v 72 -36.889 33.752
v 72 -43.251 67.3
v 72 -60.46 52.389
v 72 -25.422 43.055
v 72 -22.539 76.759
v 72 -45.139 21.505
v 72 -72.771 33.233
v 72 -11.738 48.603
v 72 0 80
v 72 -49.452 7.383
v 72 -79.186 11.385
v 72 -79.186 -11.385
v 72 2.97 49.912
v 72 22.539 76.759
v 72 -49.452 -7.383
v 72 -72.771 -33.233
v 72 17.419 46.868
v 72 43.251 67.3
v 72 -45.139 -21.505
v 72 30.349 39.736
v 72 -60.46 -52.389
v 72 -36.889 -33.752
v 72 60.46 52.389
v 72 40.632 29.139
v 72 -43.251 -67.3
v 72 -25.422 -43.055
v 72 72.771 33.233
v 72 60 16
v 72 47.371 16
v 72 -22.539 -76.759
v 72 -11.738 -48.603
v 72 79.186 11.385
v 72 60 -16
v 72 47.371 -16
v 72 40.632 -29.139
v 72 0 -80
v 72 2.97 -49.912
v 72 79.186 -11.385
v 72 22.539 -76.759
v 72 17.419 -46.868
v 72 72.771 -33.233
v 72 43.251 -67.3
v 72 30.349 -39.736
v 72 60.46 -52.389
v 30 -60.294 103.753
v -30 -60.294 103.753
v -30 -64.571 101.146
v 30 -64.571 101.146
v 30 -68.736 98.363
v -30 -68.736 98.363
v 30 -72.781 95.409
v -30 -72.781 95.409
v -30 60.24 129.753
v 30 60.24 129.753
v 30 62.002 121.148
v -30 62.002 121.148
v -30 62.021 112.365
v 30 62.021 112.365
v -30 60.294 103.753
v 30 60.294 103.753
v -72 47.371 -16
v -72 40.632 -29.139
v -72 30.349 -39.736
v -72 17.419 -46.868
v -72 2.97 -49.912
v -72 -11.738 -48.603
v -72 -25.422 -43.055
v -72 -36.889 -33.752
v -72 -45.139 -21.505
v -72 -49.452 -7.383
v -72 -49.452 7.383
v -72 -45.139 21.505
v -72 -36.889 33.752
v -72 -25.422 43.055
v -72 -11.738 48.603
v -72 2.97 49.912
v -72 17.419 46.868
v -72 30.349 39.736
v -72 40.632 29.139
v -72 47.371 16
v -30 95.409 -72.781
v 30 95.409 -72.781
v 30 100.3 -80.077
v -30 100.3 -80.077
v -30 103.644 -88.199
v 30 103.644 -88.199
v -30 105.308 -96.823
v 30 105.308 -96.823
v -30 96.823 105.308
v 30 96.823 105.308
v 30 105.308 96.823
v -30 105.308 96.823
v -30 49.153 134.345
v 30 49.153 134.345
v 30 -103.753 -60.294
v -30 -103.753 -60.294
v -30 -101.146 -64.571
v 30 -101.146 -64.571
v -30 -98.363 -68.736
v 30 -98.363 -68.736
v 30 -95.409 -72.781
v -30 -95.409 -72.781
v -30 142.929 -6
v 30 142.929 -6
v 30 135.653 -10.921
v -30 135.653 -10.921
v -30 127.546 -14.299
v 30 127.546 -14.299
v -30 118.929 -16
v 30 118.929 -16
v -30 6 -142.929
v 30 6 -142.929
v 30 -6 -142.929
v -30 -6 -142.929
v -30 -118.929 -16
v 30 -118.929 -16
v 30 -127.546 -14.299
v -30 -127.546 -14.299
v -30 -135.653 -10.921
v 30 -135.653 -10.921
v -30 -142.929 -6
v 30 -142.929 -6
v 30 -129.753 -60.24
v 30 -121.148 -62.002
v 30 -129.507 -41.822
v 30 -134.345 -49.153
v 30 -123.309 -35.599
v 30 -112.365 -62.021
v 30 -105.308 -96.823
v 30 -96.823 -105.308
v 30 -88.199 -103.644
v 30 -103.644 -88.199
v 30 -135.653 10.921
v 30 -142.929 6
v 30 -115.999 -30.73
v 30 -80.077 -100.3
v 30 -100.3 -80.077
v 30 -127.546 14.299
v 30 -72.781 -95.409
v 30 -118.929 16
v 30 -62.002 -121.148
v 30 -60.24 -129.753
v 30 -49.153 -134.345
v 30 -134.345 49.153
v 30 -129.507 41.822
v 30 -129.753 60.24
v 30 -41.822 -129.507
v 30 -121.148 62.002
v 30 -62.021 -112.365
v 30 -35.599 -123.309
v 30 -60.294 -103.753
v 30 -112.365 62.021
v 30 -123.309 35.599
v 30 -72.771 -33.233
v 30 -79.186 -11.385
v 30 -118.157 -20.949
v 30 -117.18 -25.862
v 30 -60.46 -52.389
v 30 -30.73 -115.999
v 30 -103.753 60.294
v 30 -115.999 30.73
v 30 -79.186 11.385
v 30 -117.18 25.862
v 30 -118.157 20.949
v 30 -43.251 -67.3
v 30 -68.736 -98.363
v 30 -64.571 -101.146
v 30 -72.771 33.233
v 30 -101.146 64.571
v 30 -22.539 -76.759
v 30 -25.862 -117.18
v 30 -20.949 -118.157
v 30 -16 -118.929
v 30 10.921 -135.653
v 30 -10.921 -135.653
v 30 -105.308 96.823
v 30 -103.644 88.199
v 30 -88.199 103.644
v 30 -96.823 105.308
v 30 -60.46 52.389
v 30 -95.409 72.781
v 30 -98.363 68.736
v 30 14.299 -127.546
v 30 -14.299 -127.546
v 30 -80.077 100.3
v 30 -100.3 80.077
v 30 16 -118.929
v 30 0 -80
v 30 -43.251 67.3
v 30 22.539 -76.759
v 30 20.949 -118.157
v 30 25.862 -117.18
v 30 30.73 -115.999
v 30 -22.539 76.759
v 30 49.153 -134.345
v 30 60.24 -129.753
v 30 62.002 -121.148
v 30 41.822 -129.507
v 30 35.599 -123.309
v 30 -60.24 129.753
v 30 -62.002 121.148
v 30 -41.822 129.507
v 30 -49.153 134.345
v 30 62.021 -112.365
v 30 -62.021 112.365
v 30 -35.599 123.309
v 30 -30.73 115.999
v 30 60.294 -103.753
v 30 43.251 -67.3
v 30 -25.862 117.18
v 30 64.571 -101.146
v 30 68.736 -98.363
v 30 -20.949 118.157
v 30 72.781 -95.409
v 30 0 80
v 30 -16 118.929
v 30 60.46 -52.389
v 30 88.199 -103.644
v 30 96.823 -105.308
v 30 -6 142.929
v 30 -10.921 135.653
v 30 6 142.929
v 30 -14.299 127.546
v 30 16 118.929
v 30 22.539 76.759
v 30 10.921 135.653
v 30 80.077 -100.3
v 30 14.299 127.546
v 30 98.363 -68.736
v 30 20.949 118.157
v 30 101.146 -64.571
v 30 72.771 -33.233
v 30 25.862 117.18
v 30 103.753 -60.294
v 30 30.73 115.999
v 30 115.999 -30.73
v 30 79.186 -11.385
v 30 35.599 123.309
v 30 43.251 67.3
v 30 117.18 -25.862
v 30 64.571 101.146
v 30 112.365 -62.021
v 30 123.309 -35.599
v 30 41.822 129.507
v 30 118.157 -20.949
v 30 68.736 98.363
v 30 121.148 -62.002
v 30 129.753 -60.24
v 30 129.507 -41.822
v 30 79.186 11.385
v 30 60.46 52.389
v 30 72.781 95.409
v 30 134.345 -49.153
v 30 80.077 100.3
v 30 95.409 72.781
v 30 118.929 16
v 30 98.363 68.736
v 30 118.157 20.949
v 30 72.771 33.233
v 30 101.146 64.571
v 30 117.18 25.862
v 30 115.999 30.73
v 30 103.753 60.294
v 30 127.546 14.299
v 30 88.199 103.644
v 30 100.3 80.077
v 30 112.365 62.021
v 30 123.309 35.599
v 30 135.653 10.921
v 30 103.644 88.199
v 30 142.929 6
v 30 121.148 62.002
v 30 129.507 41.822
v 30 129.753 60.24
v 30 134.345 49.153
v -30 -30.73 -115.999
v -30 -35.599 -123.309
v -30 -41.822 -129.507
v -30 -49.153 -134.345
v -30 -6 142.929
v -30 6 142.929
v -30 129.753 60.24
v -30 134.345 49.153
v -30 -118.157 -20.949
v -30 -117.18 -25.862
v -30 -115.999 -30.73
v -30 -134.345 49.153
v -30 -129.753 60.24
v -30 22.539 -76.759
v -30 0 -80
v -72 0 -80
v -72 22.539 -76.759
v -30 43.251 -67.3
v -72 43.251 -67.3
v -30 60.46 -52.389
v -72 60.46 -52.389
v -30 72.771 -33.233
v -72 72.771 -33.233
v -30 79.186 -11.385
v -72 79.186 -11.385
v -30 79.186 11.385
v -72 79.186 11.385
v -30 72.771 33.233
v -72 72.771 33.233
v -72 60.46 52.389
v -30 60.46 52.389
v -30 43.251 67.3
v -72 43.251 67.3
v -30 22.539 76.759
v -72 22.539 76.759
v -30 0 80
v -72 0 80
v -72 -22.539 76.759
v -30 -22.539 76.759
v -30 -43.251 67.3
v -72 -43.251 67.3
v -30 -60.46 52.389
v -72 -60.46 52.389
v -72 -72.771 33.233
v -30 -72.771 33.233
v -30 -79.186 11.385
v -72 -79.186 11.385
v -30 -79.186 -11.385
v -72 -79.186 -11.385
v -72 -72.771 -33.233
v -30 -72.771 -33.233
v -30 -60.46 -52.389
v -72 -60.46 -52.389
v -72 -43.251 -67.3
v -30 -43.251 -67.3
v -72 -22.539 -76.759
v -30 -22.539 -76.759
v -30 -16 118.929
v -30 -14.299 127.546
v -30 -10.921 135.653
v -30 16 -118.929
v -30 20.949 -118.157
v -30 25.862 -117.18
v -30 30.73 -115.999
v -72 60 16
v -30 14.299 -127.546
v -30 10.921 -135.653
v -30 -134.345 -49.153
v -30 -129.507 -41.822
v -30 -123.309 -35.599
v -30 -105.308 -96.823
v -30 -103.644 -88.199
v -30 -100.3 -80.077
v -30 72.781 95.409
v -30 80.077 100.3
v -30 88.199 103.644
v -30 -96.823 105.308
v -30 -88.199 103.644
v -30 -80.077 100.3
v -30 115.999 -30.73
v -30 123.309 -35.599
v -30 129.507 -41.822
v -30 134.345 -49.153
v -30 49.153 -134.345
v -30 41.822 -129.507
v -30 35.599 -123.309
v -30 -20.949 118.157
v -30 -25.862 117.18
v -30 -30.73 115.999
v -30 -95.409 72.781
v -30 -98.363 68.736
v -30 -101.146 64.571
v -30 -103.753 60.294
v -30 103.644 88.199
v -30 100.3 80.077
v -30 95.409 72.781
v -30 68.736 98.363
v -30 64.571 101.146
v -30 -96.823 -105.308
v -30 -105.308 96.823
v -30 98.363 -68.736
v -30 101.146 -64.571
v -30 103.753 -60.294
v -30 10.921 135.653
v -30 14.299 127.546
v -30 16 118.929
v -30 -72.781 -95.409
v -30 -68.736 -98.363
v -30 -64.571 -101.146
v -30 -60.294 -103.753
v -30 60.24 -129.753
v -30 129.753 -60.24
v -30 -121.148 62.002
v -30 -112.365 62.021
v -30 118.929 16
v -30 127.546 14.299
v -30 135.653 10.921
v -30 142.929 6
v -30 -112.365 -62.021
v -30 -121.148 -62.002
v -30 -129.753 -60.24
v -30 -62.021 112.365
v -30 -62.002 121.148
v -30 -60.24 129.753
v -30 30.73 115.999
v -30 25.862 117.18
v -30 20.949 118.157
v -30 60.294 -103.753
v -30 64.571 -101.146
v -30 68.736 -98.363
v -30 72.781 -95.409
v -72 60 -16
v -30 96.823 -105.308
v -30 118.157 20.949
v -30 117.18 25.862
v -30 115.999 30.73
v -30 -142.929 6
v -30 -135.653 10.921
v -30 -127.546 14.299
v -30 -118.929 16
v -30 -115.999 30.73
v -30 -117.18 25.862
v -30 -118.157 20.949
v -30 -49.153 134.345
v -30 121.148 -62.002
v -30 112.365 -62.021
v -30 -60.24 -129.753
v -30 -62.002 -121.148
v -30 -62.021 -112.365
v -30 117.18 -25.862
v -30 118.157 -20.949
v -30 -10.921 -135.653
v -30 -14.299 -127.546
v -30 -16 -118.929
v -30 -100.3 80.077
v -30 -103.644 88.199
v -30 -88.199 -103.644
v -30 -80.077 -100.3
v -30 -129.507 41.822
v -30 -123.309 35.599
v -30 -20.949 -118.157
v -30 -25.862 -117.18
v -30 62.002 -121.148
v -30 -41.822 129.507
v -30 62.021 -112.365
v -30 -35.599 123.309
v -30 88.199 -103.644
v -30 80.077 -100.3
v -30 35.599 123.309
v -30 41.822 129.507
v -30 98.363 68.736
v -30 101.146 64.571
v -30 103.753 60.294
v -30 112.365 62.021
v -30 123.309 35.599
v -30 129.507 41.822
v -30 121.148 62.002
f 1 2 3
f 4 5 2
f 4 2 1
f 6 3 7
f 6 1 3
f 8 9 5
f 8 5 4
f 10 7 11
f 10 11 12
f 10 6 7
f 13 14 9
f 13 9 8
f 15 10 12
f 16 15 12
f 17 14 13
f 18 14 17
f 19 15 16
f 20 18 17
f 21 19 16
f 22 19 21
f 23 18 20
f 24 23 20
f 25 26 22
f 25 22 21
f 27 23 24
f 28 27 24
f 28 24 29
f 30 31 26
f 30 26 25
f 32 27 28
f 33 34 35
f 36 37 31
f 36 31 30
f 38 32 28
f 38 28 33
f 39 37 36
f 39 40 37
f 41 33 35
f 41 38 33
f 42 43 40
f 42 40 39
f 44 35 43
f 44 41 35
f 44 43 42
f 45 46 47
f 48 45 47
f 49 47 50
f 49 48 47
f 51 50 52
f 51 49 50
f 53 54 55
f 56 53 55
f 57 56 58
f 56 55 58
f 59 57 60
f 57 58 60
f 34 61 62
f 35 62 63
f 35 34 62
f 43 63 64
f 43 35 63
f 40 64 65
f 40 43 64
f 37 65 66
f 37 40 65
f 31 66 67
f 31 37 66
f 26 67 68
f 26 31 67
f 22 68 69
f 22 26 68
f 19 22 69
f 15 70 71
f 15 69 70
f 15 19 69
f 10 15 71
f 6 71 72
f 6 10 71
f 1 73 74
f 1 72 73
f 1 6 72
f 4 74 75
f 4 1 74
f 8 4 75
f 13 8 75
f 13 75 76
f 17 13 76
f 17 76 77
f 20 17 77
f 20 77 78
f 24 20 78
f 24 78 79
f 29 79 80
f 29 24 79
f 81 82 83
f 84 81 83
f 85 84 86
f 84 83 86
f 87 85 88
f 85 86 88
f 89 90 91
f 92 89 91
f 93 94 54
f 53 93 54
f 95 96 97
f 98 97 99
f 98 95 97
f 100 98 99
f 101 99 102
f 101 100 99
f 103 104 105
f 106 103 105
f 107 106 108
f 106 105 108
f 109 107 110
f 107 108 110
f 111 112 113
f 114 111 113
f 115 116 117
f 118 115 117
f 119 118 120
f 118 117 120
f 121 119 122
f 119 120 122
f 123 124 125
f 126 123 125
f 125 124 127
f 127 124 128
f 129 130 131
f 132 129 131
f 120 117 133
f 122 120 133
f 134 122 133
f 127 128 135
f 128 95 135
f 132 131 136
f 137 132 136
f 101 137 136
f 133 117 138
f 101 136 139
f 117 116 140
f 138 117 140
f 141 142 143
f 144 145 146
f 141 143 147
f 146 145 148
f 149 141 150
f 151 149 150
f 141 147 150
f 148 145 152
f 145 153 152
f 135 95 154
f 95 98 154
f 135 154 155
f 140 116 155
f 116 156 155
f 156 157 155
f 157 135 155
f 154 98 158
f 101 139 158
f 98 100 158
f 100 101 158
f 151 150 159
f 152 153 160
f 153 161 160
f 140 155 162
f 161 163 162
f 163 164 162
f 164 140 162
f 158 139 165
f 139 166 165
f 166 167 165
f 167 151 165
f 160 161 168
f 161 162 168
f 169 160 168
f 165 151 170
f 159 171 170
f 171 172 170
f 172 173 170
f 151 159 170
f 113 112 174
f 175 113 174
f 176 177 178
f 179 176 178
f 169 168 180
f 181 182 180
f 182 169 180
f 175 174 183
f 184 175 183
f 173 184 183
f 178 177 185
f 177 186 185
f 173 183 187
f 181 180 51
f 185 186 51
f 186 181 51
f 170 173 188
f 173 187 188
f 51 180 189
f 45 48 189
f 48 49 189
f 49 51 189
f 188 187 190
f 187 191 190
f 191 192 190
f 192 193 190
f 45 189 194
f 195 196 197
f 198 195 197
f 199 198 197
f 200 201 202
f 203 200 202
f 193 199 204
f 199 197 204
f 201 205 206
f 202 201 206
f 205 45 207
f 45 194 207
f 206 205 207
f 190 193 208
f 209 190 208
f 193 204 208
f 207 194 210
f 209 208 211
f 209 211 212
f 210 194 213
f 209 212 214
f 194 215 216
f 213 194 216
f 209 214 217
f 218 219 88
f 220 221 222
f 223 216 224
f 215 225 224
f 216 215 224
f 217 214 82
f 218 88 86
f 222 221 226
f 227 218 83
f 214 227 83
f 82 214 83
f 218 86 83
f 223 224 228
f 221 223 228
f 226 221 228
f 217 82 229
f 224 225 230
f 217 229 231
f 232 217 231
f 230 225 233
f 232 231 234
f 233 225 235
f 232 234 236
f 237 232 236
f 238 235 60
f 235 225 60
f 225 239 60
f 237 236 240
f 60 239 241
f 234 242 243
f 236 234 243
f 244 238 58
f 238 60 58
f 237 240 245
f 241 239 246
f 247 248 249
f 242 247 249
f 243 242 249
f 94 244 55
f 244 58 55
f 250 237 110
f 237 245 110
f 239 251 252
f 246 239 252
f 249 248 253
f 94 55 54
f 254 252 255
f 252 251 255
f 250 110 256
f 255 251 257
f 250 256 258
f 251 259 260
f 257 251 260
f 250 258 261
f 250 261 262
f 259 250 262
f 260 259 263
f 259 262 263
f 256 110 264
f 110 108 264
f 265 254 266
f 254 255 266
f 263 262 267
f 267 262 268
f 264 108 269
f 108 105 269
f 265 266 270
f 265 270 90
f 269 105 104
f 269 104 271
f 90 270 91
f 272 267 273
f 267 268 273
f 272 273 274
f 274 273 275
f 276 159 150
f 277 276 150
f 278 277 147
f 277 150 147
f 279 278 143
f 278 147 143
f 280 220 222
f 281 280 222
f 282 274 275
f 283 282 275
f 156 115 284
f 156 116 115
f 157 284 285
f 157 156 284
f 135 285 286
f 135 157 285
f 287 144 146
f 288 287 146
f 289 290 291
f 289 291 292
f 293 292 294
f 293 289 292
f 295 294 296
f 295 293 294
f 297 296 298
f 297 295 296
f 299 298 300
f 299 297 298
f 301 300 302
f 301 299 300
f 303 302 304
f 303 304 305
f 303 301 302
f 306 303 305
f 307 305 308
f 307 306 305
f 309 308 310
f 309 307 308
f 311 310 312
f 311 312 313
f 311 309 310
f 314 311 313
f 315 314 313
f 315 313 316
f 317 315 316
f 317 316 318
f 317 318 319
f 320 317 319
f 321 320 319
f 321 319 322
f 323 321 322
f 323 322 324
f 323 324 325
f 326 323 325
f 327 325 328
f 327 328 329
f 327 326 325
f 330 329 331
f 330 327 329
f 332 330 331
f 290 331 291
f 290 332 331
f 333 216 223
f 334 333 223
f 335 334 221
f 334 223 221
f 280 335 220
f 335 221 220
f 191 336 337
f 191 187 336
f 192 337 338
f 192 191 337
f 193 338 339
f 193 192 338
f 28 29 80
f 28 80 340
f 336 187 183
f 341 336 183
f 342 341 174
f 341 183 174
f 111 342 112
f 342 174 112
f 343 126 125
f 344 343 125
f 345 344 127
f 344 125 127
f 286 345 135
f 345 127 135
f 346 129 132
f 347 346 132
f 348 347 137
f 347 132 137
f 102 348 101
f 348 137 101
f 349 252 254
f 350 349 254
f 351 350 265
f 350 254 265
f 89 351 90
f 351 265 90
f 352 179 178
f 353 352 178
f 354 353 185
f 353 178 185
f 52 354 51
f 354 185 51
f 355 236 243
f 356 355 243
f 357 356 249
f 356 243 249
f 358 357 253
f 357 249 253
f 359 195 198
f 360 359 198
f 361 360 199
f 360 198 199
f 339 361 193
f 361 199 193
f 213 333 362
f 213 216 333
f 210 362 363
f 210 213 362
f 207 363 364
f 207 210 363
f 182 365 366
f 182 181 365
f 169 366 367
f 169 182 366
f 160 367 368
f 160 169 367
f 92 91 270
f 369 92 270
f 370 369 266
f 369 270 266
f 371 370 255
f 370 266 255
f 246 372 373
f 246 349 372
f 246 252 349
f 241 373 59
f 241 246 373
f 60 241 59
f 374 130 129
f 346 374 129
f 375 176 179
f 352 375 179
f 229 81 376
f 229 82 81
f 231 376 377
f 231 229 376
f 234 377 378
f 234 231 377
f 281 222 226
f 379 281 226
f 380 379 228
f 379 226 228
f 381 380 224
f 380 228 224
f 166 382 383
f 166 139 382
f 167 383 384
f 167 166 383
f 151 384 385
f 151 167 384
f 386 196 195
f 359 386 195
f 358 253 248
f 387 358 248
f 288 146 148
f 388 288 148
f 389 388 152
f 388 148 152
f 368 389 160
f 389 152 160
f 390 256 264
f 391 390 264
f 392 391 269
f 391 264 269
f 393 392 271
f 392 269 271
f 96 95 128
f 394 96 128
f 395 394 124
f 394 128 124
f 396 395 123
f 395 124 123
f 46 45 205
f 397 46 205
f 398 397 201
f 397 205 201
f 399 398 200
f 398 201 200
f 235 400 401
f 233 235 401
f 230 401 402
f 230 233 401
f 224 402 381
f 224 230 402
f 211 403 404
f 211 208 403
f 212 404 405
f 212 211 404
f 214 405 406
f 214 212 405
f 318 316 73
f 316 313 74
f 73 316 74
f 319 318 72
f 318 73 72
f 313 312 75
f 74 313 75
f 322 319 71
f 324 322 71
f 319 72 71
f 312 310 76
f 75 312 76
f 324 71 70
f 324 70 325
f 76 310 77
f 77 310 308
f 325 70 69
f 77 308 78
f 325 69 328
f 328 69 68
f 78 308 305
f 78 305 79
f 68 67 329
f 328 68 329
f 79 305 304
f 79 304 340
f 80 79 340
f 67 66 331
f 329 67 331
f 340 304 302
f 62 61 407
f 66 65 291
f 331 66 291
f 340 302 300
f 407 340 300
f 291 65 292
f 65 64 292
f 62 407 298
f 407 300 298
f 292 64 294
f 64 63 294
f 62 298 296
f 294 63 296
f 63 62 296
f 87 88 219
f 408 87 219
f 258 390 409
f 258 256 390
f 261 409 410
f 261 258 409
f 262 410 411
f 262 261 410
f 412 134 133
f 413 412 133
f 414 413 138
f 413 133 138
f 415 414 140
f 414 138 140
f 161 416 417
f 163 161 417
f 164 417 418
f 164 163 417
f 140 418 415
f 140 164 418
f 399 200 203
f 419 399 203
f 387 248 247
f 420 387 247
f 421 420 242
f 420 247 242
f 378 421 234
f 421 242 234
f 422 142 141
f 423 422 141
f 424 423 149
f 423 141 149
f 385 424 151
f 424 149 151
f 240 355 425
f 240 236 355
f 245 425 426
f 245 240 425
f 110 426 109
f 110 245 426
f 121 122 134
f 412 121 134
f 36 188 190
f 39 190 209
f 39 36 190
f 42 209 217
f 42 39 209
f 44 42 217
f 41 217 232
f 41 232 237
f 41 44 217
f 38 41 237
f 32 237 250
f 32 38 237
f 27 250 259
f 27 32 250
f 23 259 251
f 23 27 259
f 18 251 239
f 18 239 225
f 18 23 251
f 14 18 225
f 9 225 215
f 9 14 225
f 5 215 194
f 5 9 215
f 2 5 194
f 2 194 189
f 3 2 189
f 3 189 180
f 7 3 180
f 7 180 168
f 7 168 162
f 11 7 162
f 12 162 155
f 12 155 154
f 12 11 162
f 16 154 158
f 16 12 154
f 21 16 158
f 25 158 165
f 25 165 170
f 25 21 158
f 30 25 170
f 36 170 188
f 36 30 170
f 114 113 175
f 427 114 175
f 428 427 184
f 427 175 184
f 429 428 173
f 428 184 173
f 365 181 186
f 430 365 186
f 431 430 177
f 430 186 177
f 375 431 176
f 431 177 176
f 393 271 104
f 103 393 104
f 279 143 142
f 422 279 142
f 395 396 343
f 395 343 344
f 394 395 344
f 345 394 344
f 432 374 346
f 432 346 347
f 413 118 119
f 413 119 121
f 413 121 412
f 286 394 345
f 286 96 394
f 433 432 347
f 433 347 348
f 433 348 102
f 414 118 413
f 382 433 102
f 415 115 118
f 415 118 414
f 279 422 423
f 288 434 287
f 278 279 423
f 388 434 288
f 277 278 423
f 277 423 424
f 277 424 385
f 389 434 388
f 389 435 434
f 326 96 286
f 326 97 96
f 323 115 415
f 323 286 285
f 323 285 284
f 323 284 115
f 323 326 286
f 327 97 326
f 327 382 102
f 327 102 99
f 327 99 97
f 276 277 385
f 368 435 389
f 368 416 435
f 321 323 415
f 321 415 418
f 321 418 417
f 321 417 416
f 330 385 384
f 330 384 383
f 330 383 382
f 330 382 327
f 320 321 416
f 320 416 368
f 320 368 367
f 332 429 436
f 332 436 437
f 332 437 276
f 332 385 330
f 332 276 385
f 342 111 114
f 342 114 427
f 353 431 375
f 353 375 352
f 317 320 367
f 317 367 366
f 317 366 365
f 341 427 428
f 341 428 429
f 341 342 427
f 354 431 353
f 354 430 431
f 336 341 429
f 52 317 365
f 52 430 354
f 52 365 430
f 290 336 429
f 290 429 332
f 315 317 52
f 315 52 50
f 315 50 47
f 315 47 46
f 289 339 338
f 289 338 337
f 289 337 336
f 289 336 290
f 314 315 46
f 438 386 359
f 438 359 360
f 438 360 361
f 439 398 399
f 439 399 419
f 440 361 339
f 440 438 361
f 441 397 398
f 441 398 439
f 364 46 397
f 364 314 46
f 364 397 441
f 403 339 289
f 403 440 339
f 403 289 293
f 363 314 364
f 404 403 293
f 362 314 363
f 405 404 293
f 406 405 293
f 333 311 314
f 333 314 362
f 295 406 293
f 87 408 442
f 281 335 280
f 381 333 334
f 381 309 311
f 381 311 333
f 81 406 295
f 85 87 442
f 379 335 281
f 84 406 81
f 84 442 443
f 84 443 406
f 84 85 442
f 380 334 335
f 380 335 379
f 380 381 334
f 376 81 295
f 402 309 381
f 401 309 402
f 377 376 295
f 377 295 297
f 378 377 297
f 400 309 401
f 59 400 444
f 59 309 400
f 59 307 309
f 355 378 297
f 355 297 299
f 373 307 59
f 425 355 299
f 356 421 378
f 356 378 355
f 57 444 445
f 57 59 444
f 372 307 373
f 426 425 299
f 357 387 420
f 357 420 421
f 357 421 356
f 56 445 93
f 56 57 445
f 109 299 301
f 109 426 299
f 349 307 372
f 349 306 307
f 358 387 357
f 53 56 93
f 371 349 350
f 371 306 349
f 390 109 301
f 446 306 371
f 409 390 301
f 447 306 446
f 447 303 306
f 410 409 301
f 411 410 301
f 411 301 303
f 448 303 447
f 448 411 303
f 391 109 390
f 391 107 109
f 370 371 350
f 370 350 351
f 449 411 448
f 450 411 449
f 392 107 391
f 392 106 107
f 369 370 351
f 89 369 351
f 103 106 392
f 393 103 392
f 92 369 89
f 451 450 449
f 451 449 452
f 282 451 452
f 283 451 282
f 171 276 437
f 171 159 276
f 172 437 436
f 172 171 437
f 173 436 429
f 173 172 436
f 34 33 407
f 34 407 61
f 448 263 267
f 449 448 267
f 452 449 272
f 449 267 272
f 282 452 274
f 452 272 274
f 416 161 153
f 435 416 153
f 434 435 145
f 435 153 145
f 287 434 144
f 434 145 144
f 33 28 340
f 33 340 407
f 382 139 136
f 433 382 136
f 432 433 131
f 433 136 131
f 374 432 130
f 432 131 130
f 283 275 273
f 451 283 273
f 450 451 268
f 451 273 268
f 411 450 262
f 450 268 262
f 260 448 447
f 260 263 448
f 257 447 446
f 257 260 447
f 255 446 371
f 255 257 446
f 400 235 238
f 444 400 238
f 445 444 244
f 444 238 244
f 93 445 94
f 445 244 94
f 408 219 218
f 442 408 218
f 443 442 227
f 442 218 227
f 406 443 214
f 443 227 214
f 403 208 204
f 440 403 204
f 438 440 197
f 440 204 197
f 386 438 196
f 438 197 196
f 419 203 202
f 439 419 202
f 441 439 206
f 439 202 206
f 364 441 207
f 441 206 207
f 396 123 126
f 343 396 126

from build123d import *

# Parameters (mm, degrees)
SKETCH1_R           = 120
BOSS_EXTRUDE1_DEPTH = 30
BOSS_EXTRUDE2_DEPTH = 60
CIRPATTERN1_COUNT   = 16
SKETCH3_R           = 80
BOSS_EXTRUDE3_DEPTH = 72
CUT_EXTRUDE1_DEPTH  = 249.179654279


with BuildPart() as part:
    # Sketch1 → Boss-Extrude1 (new, symmetric)
    with BuildSketch(Plane(origin=(0, 0, 0), x_dir=(0, 0, -1), z_dir=(1, 0, 0))):
        Circle(SKETCH1_R)
    extrude(amount=BOSS_EXTRUDE1_DEPTH, both=True)

    # Sketch2 → Boss-Extrude2 (add)
    with BuildSketch(Plane(origin=(30, 0, 0), x_dir=(0, 0, -1), z_dir=(1, 0, 0))):
        with BuildLine():
            Line((-6, 142.928549979), (6, 142.928549979))
            ThreePointArc((6, 142.928549979), (12.813200818, 131.684050319), (16, 118.928549979))
            ThreePointArc((16, 118.928549979), (0, -120), (-16, 118.928549979))
            ThreePointArc((-16, 118.928549979), (-12.813200818, 131.684050319), (-6, 142.928549979))
        make_face()
    boss_extrude2 = extrude(amount=-BOSS_EXTRUDE2_DEPTH)

    # CirPattern1: Boss-Extrude2 ×16 about axis
    cirpattern1_axis = Axis((0, 0, 0), (1, 0, 0))
    for i in range(1, CIRPATTERN1_COUNT):
        add(boss_extrude2.rotate(cirpattern1_axis, i * 360 / CIRPATTERN1_COUNT))

    # Sketch3 → Boss-Extrude3 (add, symmetric)
    with BuildSketch(Plane(origin=(0, 0, 0), x_dir=(0, 0, -1), z_dir=(1, 0, 0))):
        Circle(SKETCH3_R)
    extrude(amount=BOSS_EXTRUDE3_DEPTH, both=True)

    # Sketch4 → Cut-Extrude1 (cut, through all)
    with BuildSketch(Plane(origin=(72, 0, 0), x_dir=(0, 0, -1), z_dir=(1, 0, 0))):
        with BuildLine():
            Line((-16, 60), (16, 60))
            Line((16, 60), (16, 47.370877129))
            ThreePointArc((16, 47.370877129), (0, -50), (-16, 47.370877129))
            Line((-16, 47.370877129), (-16, 60))
        make_face()
    extrude(amount=-CUT_EXTRUDE1_DEPTH, mode=Mode.SUBTRACT)


solid = part.part
